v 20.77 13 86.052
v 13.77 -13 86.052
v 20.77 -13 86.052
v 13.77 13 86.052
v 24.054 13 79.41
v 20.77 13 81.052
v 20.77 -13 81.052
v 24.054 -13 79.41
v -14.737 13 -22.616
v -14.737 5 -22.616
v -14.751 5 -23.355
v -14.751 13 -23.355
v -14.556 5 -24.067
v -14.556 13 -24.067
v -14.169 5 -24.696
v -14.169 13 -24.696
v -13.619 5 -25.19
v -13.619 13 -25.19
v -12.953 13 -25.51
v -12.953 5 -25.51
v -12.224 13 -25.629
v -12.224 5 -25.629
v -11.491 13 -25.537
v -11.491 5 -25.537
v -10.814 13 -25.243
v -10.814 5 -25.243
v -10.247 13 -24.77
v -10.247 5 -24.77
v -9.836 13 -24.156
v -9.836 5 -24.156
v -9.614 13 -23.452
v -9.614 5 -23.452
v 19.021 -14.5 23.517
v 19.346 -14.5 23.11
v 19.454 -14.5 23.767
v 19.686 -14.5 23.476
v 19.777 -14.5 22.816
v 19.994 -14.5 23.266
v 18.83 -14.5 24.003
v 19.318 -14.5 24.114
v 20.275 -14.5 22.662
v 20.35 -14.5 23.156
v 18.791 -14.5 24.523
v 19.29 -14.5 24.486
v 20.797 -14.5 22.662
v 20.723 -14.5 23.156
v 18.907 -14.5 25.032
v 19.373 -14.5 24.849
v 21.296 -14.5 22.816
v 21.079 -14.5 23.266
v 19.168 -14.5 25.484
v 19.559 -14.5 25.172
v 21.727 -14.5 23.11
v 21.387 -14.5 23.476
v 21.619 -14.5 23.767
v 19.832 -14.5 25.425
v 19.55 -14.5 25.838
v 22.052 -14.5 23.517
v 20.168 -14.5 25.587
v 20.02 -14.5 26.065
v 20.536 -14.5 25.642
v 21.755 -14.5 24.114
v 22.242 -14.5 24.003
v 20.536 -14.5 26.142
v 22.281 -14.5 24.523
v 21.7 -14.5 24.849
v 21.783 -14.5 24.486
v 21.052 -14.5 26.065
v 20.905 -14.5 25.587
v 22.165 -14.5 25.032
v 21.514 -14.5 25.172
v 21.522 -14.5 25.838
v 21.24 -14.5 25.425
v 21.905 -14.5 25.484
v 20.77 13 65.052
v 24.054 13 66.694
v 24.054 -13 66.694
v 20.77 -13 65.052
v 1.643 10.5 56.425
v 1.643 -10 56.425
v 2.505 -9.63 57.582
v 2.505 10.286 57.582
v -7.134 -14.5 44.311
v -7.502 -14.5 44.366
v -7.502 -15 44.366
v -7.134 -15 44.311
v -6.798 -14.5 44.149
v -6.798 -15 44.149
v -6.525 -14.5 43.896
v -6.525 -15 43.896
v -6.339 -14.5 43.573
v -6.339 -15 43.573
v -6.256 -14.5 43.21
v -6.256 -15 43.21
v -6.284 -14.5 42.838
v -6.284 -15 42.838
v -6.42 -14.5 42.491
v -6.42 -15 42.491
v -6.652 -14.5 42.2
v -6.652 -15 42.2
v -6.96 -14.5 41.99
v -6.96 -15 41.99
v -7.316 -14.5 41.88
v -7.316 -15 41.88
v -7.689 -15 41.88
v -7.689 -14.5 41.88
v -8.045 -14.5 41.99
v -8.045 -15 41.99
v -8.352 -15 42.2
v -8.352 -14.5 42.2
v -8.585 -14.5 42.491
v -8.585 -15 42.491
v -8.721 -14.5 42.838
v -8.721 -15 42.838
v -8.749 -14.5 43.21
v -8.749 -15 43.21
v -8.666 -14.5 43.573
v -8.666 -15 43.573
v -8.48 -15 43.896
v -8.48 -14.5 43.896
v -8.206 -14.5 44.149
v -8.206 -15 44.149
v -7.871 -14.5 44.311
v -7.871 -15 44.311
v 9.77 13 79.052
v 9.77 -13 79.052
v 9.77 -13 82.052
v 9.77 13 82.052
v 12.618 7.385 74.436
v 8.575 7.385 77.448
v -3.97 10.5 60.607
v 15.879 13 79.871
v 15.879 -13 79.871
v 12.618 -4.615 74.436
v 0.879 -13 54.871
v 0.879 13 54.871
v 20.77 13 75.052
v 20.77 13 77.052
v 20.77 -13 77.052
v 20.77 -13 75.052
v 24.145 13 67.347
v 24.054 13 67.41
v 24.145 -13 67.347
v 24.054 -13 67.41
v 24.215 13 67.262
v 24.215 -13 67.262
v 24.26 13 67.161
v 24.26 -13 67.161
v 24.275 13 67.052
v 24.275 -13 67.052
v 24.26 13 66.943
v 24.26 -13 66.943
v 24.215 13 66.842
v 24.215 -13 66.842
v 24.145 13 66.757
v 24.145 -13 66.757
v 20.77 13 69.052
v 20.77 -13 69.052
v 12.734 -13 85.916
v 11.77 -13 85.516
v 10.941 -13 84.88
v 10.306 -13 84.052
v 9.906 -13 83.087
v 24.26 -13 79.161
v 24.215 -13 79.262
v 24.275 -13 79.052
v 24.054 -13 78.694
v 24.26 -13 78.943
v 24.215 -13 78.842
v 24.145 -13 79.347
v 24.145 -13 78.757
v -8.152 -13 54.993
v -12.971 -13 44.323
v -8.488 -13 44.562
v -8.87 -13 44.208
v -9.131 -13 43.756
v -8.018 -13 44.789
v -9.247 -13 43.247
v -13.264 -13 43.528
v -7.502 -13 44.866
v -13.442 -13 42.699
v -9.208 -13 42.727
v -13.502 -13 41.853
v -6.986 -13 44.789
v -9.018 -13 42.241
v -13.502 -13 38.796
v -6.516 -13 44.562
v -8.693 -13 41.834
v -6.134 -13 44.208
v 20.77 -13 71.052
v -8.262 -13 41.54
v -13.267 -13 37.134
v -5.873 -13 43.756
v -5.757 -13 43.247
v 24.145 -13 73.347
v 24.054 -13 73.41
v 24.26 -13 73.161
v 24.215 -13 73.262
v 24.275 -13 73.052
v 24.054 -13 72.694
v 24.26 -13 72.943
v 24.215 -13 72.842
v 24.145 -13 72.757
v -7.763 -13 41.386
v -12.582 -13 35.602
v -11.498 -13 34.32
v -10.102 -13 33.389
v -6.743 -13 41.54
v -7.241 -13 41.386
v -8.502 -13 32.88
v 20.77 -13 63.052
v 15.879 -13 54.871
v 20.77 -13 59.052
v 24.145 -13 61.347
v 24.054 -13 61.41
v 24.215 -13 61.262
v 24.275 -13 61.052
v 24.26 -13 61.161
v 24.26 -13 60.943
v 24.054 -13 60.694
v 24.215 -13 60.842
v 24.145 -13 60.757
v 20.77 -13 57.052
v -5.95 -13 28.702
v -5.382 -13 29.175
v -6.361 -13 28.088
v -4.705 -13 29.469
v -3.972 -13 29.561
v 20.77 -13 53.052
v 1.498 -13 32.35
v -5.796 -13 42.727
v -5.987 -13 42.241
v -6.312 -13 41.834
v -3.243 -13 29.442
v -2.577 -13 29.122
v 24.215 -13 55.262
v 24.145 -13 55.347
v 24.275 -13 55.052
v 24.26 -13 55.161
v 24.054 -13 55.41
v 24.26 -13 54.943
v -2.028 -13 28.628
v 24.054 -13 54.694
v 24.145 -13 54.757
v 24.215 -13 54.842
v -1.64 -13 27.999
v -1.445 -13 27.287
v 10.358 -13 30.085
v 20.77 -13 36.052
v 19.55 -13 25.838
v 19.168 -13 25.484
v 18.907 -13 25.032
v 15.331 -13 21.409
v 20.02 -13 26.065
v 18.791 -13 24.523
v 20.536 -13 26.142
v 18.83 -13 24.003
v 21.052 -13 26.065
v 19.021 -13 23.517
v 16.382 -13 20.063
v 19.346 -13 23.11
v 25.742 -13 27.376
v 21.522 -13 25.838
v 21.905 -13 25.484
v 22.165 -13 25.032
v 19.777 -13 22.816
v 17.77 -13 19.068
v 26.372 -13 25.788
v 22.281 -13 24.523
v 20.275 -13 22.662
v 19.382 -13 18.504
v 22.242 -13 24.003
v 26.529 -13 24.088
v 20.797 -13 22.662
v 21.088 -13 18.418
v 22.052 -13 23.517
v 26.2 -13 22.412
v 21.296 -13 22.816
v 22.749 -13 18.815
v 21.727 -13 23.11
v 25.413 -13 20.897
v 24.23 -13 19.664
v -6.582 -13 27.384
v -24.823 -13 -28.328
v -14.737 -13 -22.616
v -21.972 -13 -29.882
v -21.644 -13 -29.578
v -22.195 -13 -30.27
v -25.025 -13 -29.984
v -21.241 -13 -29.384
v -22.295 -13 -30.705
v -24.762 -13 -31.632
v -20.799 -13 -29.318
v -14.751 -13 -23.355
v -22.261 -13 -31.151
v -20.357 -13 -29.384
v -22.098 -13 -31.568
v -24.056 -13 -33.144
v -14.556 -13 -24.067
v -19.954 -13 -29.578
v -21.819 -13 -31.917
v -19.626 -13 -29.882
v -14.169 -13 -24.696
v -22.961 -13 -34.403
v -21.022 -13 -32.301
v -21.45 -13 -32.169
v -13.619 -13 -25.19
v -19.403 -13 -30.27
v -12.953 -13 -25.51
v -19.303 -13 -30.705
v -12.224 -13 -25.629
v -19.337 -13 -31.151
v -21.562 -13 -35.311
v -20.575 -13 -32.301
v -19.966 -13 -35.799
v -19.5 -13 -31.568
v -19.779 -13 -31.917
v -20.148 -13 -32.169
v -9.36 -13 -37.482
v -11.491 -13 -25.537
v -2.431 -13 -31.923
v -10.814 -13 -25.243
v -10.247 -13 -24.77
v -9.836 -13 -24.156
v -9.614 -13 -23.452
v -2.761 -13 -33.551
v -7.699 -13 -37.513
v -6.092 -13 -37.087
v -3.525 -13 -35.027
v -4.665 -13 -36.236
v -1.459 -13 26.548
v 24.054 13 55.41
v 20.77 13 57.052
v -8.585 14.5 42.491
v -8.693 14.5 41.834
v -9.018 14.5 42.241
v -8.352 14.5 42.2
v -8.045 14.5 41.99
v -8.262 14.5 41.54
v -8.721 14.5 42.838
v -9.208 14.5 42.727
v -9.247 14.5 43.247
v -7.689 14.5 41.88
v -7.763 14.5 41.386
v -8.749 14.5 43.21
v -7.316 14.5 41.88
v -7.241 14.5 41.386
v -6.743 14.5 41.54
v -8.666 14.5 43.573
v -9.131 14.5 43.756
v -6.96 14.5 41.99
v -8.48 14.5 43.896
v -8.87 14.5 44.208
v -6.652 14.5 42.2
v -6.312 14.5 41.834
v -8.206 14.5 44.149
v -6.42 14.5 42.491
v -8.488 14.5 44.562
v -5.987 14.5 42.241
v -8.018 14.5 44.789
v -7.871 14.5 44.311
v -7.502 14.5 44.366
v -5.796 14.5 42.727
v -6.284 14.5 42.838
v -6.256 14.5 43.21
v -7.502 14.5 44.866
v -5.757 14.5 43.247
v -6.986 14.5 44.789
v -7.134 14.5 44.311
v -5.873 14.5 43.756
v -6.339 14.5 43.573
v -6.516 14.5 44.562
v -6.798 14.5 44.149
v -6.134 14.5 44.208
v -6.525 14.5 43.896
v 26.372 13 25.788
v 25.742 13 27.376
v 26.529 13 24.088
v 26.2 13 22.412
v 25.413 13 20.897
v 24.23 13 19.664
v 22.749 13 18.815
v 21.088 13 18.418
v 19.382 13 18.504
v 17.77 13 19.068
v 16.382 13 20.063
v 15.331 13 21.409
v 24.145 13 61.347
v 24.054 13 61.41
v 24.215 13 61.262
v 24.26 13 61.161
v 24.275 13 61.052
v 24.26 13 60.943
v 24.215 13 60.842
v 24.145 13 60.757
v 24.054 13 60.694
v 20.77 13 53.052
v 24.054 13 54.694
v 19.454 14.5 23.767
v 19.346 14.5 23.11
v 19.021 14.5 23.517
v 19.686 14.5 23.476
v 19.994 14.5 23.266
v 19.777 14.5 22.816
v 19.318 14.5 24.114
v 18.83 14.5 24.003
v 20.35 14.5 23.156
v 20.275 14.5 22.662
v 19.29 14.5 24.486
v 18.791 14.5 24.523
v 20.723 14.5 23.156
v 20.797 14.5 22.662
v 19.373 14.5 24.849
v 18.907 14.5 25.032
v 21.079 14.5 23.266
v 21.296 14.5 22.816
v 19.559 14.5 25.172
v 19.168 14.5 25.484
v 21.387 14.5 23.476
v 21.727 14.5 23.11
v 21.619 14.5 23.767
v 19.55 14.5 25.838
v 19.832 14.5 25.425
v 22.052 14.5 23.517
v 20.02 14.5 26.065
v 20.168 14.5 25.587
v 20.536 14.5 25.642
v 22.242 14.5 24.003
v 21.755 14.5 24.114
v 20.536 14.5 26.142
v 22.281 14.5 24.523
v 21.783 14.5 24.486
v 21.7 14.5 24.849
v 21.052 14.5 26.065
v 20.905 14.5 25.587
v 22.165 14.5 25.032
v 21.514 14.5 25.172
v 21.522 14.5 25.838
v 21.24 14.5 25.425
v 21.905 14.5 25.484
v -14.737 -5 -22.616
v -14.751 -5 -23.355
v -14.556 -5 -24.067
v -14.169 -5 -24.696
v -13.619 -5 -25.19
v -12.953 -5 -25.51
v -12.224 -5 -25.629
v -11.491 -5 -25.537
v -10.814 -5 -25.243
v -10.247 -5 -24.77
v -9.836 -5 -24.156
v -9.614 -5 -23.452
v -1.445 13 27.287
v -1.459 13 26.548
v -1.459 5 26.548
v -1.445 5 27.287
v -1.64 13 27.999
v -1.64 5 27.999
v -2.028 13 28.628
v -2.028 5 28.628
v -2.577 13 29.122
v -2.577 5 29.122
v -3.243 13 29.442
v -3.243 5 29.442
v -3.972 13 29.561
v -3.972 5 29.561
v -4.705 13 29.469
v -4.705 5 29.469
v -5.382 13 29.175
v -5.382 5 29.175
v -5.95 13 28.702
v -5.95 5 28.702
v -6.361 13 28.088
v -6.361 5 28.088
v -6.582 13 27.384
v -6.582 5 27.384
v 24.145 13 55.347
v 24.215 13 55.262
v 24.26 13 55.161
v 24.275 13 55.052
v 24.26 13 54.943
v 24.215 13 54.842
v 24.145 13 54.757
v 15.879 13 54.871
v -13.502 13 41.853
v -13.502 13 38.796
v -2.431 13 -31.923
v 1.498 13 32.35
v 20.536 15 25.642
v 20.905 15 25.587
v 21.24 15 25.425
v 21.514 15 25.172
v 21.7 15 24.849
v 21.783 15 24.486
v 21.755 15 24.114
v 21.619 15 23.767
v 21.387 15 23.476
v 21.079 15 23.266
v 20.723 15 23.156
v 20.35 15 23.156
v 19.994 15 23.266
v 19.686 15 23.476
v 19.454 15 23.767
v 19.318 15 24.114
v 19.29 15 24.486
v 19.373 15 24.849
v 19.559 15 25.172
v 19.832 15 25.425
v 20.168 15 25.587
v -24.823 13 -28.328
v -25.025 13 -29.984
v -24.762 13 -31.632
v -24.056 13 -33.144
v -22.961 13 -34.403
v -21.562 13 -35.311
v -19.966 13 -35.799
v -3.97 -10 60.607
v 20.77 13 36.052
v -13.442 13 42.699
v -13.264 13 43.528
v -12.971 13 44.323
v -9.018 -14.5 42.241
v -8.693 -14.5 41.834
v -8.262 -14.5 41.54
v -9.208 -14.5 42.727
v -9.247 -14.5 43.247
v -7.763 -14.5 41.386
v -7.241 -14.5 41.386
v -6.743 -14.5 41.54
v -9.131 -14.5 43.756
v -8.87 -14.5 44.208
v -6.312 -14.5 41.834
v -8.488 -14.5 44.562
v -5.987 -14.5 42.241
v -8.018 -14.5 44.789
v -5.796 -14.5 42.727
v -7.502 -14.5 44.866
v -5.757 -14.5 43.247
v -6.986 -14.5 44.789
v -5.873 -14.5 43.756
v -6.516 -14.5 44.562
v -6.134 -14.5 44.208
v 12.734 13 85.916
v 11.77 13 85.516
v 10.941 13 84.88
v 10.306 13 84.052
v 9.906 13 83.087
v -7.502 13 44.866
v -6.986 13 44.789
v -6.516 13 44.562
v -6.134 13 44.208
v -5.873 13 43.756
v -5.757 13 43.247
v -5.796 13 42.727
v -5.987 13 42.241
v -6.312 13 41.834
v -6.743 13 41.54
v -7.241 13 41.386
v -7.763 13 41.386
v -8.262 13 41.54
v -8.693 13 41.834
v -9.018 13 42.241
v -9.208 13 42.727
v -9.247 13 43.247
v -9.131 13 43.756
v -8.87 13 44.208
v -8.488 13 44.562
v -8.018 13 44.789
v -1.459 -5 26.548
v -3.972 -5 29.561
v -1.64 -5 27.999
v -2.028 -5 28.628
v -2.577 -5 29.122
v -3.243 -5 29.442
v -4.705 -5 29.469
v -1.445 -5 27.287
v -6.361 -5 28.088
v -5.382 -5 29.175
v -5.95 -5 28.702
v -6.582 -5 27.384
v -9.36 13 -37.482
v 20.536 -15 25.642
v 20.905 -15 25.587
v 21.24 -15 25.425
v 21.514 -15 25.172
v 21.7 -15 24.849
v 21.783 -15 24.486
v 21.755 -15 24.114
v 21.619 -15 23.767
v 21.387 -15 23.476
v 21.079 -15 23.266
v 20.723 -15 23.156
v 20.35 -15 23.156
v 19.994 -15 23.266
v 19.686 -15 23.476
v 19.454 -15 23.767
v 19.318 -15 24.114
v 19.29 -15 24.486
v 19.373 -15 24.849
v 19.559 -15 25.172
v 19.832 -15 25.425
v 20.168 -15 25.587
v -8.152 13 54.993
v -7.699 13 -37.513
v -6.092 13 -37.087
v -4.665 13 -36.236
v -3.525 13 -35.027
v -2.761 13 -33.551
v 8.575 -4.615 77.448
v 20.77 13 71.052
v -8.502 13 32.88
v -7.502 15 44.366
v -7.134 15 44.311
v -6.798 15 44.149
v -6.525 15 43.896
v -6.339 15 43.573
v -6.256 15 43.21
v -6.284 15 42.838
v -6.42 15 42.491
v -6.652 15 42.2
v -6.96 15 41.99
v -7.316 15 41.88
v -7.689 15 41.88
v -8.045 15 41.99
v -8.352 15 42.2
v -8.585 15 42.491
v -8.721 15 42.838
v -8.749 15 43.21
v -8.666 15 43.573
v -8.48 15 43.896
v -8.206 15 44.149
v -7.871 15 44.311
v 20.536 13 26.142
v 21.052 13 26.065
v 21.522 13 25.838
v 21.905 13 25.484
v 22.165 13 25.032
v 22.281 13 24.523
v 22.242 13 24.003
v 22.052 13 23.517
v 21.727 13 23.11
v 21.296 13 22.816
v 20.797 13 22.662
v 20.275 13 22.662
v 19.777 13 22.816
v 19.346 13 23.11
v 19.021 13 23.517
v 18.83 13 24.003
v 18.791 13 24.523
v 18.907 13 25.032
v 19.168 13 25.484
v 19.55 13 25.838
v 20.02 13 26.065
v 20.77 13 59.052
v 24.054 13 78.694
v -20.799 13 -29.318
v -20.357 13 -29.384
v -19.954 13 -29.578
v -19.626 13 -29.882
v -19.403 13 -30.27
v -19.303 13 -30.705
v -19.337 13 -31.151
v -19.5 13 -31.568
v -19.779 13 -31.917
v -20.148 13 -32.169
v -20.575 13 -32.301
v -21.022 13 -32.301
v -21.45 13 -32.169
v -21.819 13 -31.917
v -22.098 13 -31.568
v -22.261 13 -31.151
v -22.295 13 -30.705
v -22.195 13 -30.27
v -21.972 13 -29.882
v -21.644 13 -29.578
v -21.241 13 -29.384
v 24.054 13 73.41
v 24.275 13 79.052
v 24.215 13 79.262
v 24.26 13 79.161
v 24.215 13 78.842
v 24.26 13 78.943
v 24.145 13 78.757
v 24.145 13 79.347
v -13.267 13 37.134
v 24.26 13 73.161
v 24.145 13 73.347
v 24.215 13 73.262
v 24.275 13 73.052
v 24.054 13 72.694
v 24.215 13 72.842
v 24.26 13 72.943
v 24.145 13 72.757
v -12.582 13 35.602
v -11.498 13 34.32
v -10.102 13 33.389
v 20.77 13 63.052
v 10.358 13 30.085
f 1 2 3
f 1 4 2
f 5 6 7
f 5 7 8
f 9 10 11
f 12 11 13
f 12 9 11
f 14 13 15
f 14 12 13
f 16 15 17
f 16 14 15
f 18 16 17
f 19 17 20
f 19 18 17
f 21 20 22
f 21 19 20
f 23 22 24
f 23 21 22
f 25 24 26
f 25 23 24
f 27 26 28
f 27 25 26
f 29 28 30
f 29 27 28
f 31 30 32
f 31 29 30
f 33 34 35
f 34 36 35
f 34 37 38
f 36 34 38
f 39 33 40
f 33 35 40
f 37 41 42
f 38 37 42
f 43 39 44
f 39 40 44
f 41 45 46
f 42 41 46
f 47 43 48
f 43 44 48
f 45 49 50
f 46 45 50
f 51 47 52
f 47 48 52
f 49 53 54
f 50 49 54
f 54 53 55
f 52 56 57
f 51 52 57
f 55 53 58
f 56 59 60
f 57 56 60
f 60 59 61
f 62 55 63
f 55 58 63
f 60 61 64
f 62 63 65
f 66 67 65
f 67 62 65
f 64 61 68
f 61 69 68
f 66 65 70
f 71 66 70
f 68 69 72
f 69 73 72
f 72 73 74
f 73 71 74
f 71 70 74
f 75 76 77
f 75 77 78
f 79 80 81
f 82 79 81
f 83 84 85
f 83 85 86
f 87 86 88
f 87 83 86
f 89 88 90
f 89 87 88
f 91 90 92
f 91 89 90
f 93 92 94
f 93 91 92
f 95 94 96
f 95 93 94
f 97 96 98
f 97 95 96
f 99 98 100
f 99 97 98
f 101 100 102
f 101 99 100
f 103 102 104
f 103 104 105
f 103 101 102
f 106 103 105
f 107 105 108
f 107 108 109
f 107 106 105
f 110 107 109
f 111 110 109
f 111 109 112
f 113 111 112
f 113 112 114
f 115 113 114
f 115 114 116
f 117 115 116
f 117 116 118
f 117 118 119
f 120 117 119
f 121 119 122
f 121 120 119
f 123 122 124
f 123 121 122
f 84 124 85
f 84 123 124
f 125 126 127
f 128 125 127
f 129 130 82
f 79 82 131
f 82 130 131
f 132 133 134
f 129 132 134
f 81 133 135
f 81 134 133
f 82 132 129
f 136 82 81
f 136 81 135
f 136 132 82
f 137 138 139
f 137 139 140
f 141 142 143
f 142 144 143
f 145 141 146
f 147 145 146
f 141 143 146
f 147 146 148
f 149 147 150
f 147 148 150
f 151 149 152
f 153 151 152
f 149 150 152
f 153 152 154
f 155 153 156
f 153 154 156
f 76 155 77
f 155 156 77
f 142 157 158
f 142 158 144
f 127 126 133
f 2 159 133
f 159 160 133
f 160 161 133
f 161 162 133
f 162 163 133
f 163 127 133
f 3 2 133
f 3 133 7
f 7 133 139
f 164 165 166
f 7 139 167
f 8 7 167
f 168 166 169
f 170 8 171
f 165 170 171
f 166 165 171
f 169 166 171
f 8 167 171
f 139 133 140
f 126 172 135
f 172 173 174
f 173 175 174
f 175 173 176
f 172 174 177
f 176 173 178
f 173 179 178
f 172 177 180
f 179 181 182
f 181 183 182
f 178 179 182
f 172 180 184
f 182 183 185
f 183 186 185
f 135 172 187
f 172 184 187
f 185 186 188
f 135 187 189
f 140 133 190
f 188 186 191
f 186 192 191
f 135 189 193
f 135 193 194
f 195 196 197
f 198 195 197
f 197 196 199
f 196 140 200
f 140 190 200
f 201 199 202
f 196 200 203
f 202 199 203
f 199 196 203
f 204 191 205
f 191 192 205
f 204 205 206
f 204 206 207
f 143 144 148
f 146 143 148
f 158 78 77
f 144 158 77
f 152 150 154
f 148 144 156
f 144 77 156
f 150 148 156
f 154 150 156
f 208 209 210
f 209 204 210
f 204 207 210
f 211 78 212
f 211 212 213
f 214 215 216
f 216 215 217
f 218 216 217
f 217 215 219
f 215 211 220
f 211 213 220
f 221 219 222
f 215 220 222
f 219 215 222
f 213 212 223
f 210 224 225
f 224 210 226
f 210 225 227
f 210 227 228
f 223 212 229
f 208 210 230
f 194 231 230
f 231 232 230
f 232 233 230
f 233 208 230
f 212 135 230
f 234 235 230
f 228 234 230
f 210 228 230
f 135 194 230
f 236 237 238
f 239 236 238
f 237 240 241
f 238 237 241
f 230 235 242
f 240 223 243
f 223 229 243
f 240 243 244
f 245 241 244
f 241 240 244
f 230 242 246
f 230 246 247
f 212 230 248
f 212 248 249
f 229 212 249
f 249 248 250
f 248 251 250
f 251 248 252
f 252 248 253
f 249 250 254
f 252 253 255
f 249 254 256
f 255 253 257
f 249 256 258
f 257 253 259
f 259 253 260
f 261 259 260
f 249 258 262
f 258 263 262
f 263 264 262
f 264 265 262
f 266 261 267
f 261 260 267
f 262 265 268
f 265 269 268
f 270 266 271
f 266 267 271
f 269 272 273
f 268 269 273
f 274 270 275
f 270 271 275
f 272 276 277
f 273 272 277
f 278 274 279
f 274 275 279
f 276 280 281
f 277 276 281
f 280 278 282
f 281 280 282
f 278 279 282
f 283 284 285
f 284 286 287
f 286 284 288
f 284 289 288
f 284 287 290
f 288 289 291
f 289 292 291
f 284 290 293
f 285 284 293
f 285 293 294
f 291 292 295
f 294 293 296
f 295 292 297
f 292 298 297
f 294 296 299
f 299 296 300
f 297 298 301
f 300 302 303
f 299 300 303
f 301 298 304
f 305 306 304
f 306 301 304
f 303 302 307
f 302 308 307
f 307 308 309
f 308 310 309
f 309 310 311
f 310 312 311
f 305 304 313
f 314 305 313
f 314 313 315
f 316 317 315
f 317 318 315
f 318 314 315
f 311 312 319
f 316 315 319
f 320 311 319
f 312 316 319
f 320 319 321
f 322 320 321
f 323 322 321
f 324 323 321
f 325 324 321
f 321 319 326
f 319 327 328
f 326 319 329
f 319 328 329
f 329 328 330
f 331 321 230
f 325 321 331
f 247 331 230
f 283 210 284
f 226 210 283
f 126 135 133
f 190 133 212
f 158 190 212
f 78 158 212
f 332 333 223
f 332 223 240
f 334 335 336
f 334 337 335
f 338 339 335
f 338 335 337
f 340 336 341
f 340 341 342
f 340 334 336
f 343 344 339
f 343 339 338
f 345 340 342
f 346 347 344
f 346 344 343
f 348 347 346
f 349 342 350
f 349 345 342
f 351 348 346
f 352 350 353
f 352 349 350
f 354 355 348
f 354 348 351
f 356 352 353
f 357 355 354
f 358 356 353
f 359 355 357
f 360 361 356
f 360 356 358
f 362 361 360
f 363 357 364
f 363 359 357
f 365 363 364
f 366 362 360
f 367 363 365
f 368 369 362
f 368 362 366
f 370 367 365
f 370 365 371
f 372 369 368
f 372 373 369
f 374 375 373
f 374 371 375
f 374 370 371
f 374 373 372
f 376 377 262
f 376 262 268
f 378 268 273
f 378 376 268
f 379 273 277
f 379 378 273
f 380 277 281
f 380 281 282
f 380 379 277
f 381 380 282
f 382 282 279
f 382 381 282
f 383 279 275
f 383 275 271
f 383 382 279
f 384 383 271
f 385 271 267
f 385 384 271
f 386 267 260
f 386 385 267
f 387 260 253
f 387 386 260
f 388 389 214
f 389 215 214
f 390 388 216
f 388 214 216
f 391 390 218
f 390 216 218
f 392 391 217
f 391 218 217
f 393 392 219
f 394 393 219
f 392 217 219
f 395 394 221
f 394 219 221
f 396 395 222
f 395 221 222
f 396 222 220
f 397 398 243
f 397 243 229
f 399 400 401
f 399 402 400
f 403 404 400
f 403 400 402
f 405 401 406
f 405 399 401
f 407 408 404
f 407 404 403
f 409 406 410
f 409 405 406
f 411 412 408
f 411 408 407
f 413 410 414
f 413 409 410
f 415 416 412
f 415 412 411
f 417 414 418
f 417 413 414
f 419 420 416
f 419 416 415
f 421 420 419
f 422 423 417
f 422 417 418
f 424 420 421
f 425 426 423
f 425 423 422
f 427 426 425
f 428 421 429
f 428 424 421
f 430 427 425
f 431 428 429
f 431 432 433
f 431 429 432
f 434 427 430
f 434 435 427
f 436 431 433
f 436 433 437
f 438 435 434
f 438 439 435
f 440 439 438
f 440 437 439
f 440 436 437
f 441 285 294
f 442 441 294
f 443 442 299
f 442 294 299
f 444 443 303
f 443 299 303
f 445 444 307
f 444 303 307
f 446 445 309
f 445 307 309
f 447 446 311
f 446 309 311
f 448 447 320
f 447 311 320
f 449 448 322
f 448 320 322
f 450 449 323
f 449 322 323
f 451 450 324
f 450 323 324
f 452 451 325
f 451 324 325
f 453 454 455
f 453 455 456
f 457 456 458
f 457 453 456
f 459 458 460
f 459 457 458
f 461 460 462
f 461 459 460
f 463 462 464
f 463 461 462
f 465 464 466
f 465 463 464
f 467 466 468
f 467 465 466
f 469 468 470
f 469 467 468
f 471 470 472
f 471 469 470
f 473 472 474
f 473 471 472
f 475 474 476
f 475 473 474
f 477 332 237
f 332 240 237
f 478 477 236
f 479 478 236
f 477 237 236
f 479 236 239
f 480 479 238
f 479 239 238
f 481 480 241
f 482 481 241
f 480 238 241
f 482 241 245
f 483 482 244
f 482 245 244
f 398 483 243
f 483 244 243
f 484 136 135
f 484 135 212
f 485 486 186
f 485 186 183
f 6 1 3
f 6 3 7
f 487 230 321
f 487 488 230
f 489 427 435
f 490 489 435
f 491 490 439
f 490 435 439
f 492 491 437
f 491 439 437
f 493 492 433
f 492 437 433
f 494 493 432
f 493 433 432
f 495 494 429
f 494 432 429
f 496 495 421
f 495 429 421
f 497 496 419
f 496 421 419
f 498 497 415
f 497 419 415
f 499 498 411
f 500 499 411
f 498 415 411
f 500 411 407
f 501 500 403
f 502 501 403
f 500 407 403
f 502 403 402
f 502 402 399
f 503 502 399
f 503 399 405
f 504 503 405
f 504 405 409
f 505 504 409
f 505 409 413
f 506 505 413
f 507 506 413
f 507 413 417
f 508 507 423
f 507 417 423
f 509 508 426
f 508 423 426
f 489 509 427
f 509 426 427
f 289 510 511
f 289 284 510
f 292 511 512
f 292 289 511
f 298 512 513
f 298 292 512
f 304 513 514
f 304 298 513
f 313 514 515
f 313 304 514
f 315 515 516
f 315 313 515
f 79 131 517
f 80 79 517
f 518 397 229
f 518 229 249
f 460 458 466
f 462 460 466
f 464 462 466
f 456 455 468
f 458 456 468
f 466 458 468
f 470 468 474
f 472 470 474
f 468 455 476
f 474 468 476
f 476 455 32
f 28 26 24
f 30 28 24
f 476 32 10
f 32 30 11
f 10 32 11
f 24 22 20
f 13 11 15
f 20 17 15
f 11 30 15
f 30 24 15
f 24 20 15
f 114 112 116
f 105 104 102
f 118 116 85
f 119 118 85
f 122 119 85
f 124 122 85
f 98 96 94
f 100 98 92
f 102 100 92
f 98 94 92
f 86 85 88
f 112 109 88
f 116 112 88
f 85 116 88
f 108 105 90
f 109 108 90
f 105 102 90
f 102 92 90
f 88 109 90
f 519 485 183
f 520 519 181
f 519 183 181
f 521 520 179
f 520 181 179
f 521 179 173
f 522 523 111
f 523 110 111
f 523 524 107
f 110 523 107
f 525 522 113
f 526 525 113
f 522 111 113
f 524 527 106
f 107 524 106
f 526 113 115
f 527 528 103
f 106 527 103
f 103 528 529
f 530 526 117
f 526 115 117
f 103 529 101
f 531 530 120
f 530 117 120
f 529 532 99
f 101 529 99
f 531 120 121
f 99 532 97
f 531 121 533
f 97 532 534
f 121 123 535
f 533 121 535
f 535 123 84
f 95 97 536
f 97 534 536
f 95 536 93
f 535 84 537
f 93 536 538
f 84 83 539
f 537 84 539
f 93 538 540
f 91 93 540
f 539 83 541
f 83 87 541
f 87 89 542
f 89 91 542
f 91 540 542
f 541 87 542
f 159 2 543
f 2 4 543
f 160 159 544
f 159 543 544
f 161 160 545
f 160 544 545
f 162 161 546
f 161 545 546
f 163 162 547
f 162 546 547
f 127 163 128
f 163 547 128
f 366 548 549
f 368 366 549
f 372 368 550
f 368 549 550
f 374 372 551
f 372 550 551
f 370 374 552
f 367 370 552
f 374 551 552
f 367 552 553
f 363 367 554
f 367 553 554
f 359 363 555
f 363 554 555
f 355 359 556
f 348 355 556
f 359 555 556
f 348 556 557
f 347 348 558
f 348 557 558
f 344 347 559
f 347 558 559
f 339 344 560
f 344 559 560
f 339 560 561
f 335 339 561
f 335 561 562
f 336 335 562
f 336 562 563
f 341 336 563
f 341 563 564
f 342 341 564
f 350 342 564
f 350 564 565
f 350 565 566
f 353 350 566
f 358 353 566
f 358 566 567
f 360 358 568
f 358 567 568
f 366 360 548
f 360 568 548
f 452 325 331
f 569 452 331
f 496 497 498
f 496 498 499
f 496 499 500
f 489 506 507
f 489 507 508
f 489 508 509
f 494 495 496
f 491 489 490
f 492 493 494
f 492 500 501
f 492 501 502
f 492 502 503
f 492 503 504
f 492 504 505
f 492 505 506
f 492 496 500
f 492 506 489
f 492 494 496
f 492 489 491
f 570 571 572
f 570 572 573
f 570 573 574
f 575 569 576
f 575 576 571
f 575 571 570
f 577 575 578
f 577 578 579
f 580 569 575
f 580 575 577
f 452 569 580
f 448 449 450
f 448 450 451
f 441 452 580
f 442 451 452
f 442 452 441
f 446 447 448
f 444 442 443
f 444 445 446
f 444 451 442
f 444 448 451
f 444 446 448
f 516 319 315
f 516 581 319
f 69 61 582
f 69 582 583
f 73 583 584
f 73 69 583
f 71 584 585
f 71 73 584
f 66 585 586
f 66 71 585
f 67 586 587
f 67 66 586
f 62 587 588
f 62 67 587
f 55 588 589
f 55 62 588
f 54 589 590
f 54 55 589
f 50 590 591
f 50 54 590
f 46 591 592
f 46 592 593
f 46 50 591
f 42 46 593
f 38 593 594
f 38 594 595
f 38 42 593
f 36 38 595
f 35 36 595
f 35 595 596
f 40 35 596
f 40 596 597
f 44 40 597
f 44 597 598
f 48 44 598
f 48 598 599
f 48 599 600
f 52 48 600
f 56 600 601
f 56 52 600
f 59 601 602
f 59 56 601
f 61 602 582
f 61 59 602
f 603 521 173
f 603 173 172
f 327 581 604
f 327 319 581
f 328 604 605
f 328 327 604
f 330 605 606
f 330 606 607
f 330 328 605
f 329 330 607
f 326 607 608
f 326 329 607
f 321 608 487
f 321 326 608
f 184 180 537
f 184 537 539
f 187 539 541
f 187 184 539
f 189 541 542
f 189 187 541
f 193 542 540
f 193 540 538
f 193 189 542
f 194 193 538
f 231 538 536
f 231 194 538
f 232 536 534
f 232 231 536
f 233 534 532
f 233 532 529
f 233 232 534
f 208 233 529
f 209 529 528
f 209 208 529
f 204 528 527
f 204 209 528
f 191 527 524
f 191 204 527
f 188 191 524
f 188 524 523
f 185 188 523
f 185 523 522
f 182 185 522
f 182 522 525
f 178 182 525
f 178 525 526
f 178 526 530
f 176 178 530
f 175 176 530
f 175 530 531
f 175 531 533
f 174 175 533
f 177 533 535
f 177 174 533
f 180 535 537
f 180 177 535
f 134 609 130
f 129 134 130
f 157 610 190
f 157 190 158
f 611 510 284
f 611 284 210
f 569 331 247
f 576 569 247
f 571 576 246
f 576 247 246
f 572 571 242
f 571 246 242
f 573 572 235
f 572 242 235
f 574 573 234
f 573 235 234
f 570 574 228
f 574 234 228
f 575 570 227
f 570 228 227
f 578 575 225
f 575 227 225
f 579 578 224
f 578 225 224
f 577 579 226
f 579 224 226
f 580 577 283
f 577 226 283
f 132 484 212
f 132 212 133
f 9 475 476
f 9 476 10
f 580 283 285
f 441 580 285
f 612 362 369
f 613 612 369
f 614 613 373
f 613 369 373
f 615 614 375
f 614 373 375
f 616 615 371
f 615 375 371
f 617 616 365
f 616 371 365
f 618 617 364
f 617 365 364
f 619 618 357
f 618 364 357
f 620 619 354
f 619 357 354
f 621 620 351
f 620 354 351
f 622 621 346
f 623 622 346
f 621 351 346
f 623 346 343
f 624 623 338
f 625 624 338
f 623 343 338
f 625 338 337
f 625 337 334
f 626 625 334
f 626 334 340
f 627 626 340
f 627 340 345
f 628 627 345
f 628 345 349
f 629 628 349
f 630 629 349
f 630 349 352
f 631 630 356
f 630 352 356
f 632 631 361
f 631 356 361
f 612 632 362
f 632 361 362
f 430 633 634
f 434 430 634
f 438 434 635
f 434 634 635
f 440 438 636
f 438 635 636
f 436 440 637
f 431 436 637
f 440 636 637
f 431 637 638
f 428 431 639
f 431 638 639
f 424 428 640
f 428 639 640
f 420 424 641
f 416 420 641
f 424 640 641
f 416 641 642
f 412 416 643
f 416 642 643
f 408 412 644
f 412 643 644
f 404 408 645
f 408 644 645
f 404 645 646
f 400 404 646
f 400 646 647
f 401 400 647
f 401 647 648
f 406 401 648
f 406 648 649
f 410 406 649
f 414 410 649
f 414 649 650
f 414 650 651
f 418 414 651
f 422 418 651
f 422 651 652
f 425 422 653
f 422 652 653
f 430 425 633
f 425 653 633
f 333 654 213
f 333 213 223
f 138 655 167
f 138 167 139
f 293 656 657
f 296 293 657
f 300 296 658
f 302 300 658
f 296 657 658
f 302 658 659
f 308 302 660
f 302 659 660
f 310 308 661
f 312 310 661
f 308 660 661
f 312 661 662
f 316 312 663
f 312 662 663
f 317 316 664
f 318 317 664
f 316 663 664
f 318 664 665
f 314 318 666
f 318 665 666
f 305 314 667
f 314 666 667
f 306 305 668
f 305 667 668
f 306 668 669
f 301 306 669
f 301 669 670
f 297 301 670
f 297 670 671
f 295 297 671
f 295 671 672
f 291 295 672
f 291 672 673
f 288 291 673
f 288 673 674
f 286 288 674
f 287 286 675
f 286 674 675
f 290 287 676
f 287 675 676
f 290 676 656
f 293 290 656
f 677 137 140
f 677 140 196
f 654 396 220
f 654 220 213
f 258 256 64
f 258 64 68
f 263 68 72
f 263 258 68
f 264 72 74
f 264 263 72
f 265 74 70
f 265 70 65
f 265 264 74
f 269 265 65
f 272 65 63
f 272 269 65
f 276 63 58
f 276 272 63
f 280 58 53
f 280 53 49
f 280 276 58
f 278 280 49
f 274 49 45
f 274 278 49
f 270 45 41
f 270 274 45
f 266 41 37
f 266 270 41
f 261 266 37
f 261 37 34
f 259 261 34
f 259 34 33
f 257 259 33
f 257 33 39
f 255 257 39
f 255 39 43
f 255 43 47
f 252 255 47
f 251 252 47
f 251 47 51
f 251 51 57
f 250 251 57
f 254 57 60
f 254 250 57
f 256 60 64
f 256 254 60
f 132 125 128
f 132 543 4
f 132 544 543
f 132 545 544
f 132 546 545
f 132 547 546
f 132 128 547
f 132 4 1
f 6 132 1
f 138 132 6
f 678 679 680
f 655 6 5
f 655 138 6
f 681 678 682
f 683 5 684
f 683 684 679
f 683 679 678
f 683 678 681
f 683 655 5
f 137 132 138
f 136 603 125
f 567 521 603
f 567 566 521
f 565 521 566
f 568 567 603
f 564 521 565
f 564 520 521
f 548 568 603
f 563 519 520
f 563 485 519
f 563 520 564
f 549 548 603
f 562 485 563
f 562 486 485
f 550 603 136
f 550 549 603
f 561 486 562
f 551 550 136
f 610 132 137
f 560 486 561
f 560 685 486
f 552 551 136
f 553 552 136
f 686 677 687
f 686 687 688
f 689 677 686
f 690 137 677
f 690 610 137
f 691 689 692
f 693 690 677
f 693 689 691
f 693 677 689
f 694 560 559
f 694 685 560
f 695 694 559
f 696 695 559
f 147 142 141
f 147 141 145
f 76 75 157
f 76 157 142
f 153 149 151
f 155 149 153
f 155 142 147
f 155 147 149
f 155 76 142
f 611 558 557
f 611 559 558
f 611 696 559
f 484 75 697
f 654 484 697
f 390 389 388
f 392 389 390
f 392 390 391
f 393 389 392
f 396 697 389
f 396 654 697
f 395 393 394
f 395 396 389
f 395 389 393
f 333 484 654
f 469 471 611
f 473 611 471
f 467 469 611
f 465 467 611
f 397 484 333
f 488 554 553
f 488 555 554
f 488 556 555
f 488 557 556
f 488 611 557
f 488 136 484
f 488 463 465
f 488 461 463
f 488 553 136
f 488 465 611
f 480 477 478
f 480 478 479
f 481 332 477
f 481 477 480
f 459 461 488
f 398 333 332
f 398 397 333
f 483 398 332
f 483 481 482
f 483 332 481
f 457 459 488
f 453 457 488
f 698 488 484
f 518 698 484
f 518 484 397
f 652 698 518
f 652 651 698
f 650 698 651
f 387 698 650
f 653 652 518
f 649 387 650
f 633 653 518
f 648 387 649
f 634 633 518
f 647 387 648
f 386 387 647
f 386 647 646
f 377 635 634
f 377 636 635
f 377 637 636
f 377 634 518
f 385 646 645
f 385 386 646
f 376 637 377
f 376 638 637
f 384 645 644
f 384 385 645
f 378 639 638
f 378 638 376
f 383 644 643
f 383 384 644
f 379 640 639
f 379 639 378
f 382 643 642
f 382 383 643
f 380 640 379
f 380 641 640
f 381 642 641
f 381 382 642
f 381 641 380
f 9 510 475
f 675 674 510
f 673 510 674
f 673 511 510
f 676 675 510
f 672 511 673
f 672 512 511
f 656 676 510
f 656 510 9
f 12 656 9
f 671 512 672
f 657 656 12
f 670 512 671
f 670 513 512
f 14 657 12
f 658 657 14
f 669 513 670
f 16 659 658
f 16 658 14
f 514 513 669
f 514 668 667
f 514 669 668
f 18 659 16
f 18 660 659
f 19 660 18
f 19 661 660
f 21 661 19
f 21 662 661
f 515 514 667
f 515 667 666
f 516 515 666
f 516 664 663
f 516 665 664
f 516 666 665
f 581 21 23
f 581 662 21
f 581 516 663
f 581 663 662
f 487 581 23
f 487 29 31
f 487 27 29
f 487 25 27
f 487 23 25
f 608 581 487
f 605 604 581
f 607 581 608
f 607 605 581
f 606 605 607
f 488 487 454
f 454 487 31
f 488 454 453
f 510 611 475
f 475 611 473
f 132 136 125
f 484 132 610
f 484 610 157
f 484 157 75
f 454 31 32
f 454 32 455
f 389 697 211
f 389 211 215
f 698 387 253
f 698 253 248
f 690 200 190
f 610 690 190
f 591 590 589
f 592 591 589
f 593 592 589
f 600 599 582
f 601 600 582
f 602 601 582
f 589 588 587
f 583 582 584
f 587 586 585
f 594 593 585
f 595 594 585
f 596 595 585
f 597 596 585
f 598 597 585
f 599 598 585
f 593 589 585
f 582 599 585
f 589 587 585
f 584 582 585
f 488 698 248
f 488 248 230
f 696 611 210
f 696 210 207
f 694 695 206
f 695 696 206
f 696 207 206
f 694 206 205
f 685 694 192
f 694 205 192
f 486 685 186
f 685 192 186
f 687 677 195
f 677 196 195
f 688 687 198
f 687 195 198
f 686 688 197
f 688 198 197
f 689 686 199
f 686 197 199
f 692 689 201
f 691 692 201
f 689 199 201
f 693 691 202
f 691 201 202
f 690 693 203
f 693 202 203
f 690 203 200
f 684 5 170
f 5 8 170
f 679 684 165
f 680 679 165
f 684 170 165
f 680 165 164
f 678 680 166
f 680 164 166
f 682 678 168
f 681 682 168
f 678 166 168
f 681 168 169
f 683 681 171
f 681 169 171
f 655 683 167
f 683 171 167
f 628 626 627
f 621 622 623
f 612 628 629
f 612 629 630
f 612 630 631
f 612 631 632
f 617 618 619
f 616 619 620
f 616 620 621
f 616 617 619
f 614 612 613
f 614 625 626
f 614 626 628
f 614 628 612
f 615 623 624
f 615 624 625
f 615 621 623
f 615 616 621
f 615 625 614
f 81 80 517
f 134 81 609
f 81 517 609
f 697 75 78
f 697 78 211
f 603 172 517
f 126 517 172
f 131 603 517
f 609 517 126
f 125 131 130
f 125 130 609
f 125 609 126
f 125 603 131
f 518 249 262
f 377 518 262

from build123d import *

# Parameters (mm, degrees)
BOSS_EXTRUDE1_DEPTH = 13
CUT_EXTRUDE1_DEPTH  = 26
BOSS_EXTRUDE3_DEPTH = 26
LPATTERN1_COUNT     = 5
LPATTERN1_PITCH     = 6
FILLET1_R           = 6
FILLET2_R           = 0.4
FILLET3_R           = 0.4
FILLET4_R           = 0.4
FILLET5_R           = 0.4
FILLET6_R           = 0.4
FILLET7_R           = 6
FILLET8_R           = 4
SKETCH4_R           = 1.5
CUT_EXTRUDE2_DEPTH  = 26
CUT_EXTRUDE3_DEPTH  = 7
SKETCH6_R           = 1.75
BOSS_EXTRUDE4_DEPTH = 1.5
SKETCH7_R           = 1.25
BOSS_EXTRUDE5_DEPTH = 0.5
CUT_EXTRUDE7_DEPTH  = 10


with BuildPart() as part:
    # Sketch1 → Boss-Extrude1 (new, symmetric)
    with BuildSketch(Plane(origin=(0, 0, 0), x_dir=(1, 0, 0), z_dir=(0, 1, 0))):
        Polygon((-26.537476469, 34.756624027), (-8.502257827, -32.880132907), (1.497742173, -32.349622066), (-2.834075277, 38.51810936), align=None)
        with BuildLine():
            Line((20.769613605, -36.051991051), (25.741983559, -27.375843459))
            ThreePointArc((25.741983559, -27.375843459), (23.519716976, -19.186732931), (15.330606448, -21.408999514))
            Line((15.330606448, -21.408999514), (10.358236494, -30.085147107))
            Line((10.358236494, -30.085147107), (1.497742173, -32.349622066))
            Line((1.497742173, -32.349622066), (-13.502257827, -33.145388327))
            Line((-13.502257827, -33.145388327), (-13.502257827, -43.145388327))
            Line((-13.502257827, -43.145388327), (-8.151905345, -54.993330272))
            Line((-8.151905345, -54.993330272), (9.769613605, -79.051991051))
            Line((9.769613605, -79.051991051), (9.769613605, -86.051991051))
            Line((9.769613605, -86.051991051), (20.769613605, -86.051991051))
            Line((20.769613605, -86.051991051), (20.769613605, -36.051991051))
        make_face()
    extrude(amount=BOSS_EXTRUDE1_DEPTH, both=True)

    # Sketch2 → Cut-Extrude1 (cut)
    with BuildSketch(Plane(origin=(0, 13, 0), x_dir=(1, 0, 0), z_dir=(0, 1, 0))):
        Polygon((0.878679347, -54.871314491), (15.878679347, -54.871314491), (15.878679347, -79.871314491), align=None)
    extrude(amount=-CUT_EXTRUDE1_DEPTH, mode=Mode.SUBTRACT)

    # Sketch3 → Boss-Extrude3 (add)
    with BuildSketch(Plane(origin=(0, 13, 0), x_dir=(1, 0, 0), z_dir=(0, 1, 0))):
        Polygon((20.769613605, -77.051991051), (20.769613605, -79.051991051), (24.769613605, -79.051991051), align=None)
        Polygon((20.769613605, -79.051991051), (20.769613605, -81.051991051), (24.769613605, -79.051991051), align=None)
    boss_extrude3 = extrude(amount=-BOSS_EXTRUDE3_DEPTH)

    # LPattern1: Boss-Extrude3 ×5
    with Locations(*[(0, 0, -i * LPATTERN1_PITCH) for i in range(1, LPATTERN1_COUNT)]):
        add(boss_extrude3)

    # Fillet1
    fillet1_edges = [part.edges().sort_by_distance(p)[0] for p in [
        (-26.537476469, 0, -34.756624027),
        (-2.834075277, 0, -38.51810936),
    ]]
    fillet(fillet1_edges, radius=FILLET1_R)

    # Fillet2
    fillet2_edges = [part.edges().sort_by_distance(p)[0] for p in [
        (24.769613605, 0, 79.051991051),
    ]]
    fillet(fillet2_edges, radius=FILLET2_R)

    # Fillet3
    fillet3_edges = [part.edges().sort_by_distance(p)[0] for p in [
        (24.769613605, 0, 73.051991051),
    ]]
    fillet(fillet3_edges, radius=FILLET3_R)

    # Fillet4
    fillet4_edges = [part.edges().sort_by_distance(p)[0] for p in [
        (24.769613605, 0, 67.051991051),
    ]]
    fillet(fillet4_edges, radius=FILLET4_R)

    # Fillet5
    fillet5_edges = [part.edges().sort_by_distance(p)[0] for p in [
        (24.769613605, 0, 61.051991051),
    ]]
    fillet(fillet5_edges, radius=FILLET5_R)

    # Fillet6
    fillet6_edges = [part.edges().sort_by_distance(p)[0] for p in [
        (24.769613605, 0, 55.051991051),
    ]]
    fillet(fillet6_edges, radius=FILLET6_R)

    # Fillet7
    # the kernel refuses this fillet: 6 mm, written as the material it takes off along each edge
    with BuildSketch(Plane(origin=(-13.502257827, -16.229856517, 43.145388327), x_dir=(0, 0, -1), z_dir=(0, 1, 0))) as fillet7_piece_1:
        with BuildLine():
            CenterArc((FILLET7_R * 0.215323767796, -FILLET7_R), FILLET7_R, 90, 24.303219814)
            Line((-FILLET7_R * 0.196241807704, -FILLET7_R * 0.0886198504117), (-FILLET7_R * 0.204473119214, -FILLET7_R * 0.0703922474199))
            Line((-FILLET7_R * 0.204473119214, -FILLET7_R * 0.0703922474199), (-FILLET7_R * 0.00430647535592, FILLET7_R * 0.02))
            Line((-FILLET7_R * 0.00430647535592, FILLET7_R * 0.02), (FILLET7_R * 0.215323767796, FILLET7_R * 0.02))
            Line((FILLET7_R * 0.215323767796, FILLET7_R * 0.02), (FILLET7_R * 0.215323767796, 0))
        make_face()
    extrude(amount=32.459713034, mode=Mode.SUBTRACT)
    with BuildSketch(Plane(origin=(-13.502257827, -27.127060907, 33.145388327), x_dir=(0.9985957546463174, 0, -0.052976587303748185), z_dir=(0, 1, 0))) as fillet7_piece_2_section:
        with BuildLine():
            CenterArc((5.692213138, -5.960748743), FILLET7_R, 96.557311778, 80.405931773)
            Line((-0.29936139, -5.642889219), (-0.419192881, -5.636532029))
            Line((-0.419192881, -5.636532029), (-0.119831491, 0.00635719))
            Line((-0.119831491, 0.00635719), (0, 0.12))
            ThreePointArc((0, 0.12), (2.50351555, 0.12), (4.993327459, 0.119214975))
            Line((4.993327459, 0.119214975), (5.0070311, 0))
        make_face()
    fillet7_piece_2 = extrude(amount=54.254121814, mode=Mode.PRIVATE)
    fillet7_piece_2 = split(fillet7_piece_2, bisect_by=Plane(origin=(-8.382183635, 0, 33.330442332), z_dir=(-0.9662393847687492, 0, 0.25764598060460653)), keep=Keep.TOP, mode=Mode.PRIVATE)
    add(fillet7_piece_2, mode=Mode.SUBTRACT)

    # Fillet8
    fillet8_edges = [part.edges().sort_by_distance(p)[0] for p in [
        (9.769613605, 0, 86.051991051),
    ]]
    fillet(fillet8_edges, radius=FILLET8_R)

    # Sketch4 → Cut-Extrude2 (cut)
    with BuildSketch(Plane(origin=(0, 13, 0), x_dir=(1, 0, 0), z_dir=(0, 1, 0))):
        with Locations(Location((-20.798923606, 30.81758039, 0), (0, 0, 270))):
            Circle(SKETCH4_R)
    extrude(amount=-CUT_EXTRUDE2_DEPTH, mode=Mode.SUBTRACT)

    # Sketch5 → Cut-Extrude3 (cut)
    with BuildSketch(Plane(origin=(-31.588699111, 0, 23.530714154), x_dir=(0.5973839650110779, 0, 0.8019553593234747), z_dir=(-0.8019553593234747, 0, 0.5973839650110779))):
        Polygon((67.232378401, 7.385302578), (46.232378401, 10.5), (46.232378401, -10), (67.232378401, -4.614697422), align=None)
    extrude(amount=-CUT_EXTRUDE3_DEPTH, mode=Mode.SUBTRACT)

    # Sketch6 → Boss-Extrude4 (add)
    with BuildSketch(Plane(origin=(0, 13, 0), x_dir=(1, 0, 0), z_dir=(0, 1, 0))):
        with Locations(Location((20.536295004, -24.392421487, 0), (0, 0, 270))):
            Circle(SKETCH6_R)
        with Locations(Location((-7.502257827, -43.116441091, 0), (0, 0, 270))):
            Circle(SKETCH6_R)
    boss_extrude4 = extrude(amount=BOSS_EXTRUDE4_DEPTH)

    # Sketch7 → Boss-Extrude5 (add)
    with BuildSketch(Plane(origin=(0, 14.5, 0), x_dir=(1, 0, 0), z_dir=(0, 1, 0))):
        with Locations(Location((-7.502257827, -43.116441091, 0), (0, 0, 270))):
            Circle(SKETCH7_R)
        with Locations(Location((20.536295004, -24.392421487, 0), (0, 0, 270))):
            Circle(SKETCH7_R)
    boss_extrude5 = extrude(amount=BOSS_EXTRUDE5_DEPTH)

    # Sketch8 → Cut-Extrude7 (cut)
    with BuildSketch(Plane(origin=(0, 15, 0), x_dir=(1, 0, 0), z_dir=(0, 1, 0))):
        with BuildLine():
            Line((-9.614117845, 23.451702753), (-1.459254761, -26.548297247))
            ThreePointArc((-1.459254761, -26.548297247), (-3.602858696, -29.527400736), (-6.581962185, -27.3837968))
            Line((-6.581962185, -27.3837968), (-14.736825269, 22.6162032))
            ThreePointArc((-14.736825269, 22.6162032), (-12.593221334, 25.595306688), (-9.614117845, 23.451702753))
        make_face()
    cut_extrude7 = extrude(amount=-CUT_EXTRUDE7_DEPTH, mode=Mode.SUBTRACT)

    # Mirror1: Boss-Extrude4, Boss-Extrude5, Cut-Extrude7 across plane
    add(boss_extrude4.mirror(Plane.ZX))
    add(boss_extrude5.mirror(Plane.ZX))
    add(cut_extrude7.mirror(Plane.ZX), mode=Mode.SUBTRACT)


solid = part.part
